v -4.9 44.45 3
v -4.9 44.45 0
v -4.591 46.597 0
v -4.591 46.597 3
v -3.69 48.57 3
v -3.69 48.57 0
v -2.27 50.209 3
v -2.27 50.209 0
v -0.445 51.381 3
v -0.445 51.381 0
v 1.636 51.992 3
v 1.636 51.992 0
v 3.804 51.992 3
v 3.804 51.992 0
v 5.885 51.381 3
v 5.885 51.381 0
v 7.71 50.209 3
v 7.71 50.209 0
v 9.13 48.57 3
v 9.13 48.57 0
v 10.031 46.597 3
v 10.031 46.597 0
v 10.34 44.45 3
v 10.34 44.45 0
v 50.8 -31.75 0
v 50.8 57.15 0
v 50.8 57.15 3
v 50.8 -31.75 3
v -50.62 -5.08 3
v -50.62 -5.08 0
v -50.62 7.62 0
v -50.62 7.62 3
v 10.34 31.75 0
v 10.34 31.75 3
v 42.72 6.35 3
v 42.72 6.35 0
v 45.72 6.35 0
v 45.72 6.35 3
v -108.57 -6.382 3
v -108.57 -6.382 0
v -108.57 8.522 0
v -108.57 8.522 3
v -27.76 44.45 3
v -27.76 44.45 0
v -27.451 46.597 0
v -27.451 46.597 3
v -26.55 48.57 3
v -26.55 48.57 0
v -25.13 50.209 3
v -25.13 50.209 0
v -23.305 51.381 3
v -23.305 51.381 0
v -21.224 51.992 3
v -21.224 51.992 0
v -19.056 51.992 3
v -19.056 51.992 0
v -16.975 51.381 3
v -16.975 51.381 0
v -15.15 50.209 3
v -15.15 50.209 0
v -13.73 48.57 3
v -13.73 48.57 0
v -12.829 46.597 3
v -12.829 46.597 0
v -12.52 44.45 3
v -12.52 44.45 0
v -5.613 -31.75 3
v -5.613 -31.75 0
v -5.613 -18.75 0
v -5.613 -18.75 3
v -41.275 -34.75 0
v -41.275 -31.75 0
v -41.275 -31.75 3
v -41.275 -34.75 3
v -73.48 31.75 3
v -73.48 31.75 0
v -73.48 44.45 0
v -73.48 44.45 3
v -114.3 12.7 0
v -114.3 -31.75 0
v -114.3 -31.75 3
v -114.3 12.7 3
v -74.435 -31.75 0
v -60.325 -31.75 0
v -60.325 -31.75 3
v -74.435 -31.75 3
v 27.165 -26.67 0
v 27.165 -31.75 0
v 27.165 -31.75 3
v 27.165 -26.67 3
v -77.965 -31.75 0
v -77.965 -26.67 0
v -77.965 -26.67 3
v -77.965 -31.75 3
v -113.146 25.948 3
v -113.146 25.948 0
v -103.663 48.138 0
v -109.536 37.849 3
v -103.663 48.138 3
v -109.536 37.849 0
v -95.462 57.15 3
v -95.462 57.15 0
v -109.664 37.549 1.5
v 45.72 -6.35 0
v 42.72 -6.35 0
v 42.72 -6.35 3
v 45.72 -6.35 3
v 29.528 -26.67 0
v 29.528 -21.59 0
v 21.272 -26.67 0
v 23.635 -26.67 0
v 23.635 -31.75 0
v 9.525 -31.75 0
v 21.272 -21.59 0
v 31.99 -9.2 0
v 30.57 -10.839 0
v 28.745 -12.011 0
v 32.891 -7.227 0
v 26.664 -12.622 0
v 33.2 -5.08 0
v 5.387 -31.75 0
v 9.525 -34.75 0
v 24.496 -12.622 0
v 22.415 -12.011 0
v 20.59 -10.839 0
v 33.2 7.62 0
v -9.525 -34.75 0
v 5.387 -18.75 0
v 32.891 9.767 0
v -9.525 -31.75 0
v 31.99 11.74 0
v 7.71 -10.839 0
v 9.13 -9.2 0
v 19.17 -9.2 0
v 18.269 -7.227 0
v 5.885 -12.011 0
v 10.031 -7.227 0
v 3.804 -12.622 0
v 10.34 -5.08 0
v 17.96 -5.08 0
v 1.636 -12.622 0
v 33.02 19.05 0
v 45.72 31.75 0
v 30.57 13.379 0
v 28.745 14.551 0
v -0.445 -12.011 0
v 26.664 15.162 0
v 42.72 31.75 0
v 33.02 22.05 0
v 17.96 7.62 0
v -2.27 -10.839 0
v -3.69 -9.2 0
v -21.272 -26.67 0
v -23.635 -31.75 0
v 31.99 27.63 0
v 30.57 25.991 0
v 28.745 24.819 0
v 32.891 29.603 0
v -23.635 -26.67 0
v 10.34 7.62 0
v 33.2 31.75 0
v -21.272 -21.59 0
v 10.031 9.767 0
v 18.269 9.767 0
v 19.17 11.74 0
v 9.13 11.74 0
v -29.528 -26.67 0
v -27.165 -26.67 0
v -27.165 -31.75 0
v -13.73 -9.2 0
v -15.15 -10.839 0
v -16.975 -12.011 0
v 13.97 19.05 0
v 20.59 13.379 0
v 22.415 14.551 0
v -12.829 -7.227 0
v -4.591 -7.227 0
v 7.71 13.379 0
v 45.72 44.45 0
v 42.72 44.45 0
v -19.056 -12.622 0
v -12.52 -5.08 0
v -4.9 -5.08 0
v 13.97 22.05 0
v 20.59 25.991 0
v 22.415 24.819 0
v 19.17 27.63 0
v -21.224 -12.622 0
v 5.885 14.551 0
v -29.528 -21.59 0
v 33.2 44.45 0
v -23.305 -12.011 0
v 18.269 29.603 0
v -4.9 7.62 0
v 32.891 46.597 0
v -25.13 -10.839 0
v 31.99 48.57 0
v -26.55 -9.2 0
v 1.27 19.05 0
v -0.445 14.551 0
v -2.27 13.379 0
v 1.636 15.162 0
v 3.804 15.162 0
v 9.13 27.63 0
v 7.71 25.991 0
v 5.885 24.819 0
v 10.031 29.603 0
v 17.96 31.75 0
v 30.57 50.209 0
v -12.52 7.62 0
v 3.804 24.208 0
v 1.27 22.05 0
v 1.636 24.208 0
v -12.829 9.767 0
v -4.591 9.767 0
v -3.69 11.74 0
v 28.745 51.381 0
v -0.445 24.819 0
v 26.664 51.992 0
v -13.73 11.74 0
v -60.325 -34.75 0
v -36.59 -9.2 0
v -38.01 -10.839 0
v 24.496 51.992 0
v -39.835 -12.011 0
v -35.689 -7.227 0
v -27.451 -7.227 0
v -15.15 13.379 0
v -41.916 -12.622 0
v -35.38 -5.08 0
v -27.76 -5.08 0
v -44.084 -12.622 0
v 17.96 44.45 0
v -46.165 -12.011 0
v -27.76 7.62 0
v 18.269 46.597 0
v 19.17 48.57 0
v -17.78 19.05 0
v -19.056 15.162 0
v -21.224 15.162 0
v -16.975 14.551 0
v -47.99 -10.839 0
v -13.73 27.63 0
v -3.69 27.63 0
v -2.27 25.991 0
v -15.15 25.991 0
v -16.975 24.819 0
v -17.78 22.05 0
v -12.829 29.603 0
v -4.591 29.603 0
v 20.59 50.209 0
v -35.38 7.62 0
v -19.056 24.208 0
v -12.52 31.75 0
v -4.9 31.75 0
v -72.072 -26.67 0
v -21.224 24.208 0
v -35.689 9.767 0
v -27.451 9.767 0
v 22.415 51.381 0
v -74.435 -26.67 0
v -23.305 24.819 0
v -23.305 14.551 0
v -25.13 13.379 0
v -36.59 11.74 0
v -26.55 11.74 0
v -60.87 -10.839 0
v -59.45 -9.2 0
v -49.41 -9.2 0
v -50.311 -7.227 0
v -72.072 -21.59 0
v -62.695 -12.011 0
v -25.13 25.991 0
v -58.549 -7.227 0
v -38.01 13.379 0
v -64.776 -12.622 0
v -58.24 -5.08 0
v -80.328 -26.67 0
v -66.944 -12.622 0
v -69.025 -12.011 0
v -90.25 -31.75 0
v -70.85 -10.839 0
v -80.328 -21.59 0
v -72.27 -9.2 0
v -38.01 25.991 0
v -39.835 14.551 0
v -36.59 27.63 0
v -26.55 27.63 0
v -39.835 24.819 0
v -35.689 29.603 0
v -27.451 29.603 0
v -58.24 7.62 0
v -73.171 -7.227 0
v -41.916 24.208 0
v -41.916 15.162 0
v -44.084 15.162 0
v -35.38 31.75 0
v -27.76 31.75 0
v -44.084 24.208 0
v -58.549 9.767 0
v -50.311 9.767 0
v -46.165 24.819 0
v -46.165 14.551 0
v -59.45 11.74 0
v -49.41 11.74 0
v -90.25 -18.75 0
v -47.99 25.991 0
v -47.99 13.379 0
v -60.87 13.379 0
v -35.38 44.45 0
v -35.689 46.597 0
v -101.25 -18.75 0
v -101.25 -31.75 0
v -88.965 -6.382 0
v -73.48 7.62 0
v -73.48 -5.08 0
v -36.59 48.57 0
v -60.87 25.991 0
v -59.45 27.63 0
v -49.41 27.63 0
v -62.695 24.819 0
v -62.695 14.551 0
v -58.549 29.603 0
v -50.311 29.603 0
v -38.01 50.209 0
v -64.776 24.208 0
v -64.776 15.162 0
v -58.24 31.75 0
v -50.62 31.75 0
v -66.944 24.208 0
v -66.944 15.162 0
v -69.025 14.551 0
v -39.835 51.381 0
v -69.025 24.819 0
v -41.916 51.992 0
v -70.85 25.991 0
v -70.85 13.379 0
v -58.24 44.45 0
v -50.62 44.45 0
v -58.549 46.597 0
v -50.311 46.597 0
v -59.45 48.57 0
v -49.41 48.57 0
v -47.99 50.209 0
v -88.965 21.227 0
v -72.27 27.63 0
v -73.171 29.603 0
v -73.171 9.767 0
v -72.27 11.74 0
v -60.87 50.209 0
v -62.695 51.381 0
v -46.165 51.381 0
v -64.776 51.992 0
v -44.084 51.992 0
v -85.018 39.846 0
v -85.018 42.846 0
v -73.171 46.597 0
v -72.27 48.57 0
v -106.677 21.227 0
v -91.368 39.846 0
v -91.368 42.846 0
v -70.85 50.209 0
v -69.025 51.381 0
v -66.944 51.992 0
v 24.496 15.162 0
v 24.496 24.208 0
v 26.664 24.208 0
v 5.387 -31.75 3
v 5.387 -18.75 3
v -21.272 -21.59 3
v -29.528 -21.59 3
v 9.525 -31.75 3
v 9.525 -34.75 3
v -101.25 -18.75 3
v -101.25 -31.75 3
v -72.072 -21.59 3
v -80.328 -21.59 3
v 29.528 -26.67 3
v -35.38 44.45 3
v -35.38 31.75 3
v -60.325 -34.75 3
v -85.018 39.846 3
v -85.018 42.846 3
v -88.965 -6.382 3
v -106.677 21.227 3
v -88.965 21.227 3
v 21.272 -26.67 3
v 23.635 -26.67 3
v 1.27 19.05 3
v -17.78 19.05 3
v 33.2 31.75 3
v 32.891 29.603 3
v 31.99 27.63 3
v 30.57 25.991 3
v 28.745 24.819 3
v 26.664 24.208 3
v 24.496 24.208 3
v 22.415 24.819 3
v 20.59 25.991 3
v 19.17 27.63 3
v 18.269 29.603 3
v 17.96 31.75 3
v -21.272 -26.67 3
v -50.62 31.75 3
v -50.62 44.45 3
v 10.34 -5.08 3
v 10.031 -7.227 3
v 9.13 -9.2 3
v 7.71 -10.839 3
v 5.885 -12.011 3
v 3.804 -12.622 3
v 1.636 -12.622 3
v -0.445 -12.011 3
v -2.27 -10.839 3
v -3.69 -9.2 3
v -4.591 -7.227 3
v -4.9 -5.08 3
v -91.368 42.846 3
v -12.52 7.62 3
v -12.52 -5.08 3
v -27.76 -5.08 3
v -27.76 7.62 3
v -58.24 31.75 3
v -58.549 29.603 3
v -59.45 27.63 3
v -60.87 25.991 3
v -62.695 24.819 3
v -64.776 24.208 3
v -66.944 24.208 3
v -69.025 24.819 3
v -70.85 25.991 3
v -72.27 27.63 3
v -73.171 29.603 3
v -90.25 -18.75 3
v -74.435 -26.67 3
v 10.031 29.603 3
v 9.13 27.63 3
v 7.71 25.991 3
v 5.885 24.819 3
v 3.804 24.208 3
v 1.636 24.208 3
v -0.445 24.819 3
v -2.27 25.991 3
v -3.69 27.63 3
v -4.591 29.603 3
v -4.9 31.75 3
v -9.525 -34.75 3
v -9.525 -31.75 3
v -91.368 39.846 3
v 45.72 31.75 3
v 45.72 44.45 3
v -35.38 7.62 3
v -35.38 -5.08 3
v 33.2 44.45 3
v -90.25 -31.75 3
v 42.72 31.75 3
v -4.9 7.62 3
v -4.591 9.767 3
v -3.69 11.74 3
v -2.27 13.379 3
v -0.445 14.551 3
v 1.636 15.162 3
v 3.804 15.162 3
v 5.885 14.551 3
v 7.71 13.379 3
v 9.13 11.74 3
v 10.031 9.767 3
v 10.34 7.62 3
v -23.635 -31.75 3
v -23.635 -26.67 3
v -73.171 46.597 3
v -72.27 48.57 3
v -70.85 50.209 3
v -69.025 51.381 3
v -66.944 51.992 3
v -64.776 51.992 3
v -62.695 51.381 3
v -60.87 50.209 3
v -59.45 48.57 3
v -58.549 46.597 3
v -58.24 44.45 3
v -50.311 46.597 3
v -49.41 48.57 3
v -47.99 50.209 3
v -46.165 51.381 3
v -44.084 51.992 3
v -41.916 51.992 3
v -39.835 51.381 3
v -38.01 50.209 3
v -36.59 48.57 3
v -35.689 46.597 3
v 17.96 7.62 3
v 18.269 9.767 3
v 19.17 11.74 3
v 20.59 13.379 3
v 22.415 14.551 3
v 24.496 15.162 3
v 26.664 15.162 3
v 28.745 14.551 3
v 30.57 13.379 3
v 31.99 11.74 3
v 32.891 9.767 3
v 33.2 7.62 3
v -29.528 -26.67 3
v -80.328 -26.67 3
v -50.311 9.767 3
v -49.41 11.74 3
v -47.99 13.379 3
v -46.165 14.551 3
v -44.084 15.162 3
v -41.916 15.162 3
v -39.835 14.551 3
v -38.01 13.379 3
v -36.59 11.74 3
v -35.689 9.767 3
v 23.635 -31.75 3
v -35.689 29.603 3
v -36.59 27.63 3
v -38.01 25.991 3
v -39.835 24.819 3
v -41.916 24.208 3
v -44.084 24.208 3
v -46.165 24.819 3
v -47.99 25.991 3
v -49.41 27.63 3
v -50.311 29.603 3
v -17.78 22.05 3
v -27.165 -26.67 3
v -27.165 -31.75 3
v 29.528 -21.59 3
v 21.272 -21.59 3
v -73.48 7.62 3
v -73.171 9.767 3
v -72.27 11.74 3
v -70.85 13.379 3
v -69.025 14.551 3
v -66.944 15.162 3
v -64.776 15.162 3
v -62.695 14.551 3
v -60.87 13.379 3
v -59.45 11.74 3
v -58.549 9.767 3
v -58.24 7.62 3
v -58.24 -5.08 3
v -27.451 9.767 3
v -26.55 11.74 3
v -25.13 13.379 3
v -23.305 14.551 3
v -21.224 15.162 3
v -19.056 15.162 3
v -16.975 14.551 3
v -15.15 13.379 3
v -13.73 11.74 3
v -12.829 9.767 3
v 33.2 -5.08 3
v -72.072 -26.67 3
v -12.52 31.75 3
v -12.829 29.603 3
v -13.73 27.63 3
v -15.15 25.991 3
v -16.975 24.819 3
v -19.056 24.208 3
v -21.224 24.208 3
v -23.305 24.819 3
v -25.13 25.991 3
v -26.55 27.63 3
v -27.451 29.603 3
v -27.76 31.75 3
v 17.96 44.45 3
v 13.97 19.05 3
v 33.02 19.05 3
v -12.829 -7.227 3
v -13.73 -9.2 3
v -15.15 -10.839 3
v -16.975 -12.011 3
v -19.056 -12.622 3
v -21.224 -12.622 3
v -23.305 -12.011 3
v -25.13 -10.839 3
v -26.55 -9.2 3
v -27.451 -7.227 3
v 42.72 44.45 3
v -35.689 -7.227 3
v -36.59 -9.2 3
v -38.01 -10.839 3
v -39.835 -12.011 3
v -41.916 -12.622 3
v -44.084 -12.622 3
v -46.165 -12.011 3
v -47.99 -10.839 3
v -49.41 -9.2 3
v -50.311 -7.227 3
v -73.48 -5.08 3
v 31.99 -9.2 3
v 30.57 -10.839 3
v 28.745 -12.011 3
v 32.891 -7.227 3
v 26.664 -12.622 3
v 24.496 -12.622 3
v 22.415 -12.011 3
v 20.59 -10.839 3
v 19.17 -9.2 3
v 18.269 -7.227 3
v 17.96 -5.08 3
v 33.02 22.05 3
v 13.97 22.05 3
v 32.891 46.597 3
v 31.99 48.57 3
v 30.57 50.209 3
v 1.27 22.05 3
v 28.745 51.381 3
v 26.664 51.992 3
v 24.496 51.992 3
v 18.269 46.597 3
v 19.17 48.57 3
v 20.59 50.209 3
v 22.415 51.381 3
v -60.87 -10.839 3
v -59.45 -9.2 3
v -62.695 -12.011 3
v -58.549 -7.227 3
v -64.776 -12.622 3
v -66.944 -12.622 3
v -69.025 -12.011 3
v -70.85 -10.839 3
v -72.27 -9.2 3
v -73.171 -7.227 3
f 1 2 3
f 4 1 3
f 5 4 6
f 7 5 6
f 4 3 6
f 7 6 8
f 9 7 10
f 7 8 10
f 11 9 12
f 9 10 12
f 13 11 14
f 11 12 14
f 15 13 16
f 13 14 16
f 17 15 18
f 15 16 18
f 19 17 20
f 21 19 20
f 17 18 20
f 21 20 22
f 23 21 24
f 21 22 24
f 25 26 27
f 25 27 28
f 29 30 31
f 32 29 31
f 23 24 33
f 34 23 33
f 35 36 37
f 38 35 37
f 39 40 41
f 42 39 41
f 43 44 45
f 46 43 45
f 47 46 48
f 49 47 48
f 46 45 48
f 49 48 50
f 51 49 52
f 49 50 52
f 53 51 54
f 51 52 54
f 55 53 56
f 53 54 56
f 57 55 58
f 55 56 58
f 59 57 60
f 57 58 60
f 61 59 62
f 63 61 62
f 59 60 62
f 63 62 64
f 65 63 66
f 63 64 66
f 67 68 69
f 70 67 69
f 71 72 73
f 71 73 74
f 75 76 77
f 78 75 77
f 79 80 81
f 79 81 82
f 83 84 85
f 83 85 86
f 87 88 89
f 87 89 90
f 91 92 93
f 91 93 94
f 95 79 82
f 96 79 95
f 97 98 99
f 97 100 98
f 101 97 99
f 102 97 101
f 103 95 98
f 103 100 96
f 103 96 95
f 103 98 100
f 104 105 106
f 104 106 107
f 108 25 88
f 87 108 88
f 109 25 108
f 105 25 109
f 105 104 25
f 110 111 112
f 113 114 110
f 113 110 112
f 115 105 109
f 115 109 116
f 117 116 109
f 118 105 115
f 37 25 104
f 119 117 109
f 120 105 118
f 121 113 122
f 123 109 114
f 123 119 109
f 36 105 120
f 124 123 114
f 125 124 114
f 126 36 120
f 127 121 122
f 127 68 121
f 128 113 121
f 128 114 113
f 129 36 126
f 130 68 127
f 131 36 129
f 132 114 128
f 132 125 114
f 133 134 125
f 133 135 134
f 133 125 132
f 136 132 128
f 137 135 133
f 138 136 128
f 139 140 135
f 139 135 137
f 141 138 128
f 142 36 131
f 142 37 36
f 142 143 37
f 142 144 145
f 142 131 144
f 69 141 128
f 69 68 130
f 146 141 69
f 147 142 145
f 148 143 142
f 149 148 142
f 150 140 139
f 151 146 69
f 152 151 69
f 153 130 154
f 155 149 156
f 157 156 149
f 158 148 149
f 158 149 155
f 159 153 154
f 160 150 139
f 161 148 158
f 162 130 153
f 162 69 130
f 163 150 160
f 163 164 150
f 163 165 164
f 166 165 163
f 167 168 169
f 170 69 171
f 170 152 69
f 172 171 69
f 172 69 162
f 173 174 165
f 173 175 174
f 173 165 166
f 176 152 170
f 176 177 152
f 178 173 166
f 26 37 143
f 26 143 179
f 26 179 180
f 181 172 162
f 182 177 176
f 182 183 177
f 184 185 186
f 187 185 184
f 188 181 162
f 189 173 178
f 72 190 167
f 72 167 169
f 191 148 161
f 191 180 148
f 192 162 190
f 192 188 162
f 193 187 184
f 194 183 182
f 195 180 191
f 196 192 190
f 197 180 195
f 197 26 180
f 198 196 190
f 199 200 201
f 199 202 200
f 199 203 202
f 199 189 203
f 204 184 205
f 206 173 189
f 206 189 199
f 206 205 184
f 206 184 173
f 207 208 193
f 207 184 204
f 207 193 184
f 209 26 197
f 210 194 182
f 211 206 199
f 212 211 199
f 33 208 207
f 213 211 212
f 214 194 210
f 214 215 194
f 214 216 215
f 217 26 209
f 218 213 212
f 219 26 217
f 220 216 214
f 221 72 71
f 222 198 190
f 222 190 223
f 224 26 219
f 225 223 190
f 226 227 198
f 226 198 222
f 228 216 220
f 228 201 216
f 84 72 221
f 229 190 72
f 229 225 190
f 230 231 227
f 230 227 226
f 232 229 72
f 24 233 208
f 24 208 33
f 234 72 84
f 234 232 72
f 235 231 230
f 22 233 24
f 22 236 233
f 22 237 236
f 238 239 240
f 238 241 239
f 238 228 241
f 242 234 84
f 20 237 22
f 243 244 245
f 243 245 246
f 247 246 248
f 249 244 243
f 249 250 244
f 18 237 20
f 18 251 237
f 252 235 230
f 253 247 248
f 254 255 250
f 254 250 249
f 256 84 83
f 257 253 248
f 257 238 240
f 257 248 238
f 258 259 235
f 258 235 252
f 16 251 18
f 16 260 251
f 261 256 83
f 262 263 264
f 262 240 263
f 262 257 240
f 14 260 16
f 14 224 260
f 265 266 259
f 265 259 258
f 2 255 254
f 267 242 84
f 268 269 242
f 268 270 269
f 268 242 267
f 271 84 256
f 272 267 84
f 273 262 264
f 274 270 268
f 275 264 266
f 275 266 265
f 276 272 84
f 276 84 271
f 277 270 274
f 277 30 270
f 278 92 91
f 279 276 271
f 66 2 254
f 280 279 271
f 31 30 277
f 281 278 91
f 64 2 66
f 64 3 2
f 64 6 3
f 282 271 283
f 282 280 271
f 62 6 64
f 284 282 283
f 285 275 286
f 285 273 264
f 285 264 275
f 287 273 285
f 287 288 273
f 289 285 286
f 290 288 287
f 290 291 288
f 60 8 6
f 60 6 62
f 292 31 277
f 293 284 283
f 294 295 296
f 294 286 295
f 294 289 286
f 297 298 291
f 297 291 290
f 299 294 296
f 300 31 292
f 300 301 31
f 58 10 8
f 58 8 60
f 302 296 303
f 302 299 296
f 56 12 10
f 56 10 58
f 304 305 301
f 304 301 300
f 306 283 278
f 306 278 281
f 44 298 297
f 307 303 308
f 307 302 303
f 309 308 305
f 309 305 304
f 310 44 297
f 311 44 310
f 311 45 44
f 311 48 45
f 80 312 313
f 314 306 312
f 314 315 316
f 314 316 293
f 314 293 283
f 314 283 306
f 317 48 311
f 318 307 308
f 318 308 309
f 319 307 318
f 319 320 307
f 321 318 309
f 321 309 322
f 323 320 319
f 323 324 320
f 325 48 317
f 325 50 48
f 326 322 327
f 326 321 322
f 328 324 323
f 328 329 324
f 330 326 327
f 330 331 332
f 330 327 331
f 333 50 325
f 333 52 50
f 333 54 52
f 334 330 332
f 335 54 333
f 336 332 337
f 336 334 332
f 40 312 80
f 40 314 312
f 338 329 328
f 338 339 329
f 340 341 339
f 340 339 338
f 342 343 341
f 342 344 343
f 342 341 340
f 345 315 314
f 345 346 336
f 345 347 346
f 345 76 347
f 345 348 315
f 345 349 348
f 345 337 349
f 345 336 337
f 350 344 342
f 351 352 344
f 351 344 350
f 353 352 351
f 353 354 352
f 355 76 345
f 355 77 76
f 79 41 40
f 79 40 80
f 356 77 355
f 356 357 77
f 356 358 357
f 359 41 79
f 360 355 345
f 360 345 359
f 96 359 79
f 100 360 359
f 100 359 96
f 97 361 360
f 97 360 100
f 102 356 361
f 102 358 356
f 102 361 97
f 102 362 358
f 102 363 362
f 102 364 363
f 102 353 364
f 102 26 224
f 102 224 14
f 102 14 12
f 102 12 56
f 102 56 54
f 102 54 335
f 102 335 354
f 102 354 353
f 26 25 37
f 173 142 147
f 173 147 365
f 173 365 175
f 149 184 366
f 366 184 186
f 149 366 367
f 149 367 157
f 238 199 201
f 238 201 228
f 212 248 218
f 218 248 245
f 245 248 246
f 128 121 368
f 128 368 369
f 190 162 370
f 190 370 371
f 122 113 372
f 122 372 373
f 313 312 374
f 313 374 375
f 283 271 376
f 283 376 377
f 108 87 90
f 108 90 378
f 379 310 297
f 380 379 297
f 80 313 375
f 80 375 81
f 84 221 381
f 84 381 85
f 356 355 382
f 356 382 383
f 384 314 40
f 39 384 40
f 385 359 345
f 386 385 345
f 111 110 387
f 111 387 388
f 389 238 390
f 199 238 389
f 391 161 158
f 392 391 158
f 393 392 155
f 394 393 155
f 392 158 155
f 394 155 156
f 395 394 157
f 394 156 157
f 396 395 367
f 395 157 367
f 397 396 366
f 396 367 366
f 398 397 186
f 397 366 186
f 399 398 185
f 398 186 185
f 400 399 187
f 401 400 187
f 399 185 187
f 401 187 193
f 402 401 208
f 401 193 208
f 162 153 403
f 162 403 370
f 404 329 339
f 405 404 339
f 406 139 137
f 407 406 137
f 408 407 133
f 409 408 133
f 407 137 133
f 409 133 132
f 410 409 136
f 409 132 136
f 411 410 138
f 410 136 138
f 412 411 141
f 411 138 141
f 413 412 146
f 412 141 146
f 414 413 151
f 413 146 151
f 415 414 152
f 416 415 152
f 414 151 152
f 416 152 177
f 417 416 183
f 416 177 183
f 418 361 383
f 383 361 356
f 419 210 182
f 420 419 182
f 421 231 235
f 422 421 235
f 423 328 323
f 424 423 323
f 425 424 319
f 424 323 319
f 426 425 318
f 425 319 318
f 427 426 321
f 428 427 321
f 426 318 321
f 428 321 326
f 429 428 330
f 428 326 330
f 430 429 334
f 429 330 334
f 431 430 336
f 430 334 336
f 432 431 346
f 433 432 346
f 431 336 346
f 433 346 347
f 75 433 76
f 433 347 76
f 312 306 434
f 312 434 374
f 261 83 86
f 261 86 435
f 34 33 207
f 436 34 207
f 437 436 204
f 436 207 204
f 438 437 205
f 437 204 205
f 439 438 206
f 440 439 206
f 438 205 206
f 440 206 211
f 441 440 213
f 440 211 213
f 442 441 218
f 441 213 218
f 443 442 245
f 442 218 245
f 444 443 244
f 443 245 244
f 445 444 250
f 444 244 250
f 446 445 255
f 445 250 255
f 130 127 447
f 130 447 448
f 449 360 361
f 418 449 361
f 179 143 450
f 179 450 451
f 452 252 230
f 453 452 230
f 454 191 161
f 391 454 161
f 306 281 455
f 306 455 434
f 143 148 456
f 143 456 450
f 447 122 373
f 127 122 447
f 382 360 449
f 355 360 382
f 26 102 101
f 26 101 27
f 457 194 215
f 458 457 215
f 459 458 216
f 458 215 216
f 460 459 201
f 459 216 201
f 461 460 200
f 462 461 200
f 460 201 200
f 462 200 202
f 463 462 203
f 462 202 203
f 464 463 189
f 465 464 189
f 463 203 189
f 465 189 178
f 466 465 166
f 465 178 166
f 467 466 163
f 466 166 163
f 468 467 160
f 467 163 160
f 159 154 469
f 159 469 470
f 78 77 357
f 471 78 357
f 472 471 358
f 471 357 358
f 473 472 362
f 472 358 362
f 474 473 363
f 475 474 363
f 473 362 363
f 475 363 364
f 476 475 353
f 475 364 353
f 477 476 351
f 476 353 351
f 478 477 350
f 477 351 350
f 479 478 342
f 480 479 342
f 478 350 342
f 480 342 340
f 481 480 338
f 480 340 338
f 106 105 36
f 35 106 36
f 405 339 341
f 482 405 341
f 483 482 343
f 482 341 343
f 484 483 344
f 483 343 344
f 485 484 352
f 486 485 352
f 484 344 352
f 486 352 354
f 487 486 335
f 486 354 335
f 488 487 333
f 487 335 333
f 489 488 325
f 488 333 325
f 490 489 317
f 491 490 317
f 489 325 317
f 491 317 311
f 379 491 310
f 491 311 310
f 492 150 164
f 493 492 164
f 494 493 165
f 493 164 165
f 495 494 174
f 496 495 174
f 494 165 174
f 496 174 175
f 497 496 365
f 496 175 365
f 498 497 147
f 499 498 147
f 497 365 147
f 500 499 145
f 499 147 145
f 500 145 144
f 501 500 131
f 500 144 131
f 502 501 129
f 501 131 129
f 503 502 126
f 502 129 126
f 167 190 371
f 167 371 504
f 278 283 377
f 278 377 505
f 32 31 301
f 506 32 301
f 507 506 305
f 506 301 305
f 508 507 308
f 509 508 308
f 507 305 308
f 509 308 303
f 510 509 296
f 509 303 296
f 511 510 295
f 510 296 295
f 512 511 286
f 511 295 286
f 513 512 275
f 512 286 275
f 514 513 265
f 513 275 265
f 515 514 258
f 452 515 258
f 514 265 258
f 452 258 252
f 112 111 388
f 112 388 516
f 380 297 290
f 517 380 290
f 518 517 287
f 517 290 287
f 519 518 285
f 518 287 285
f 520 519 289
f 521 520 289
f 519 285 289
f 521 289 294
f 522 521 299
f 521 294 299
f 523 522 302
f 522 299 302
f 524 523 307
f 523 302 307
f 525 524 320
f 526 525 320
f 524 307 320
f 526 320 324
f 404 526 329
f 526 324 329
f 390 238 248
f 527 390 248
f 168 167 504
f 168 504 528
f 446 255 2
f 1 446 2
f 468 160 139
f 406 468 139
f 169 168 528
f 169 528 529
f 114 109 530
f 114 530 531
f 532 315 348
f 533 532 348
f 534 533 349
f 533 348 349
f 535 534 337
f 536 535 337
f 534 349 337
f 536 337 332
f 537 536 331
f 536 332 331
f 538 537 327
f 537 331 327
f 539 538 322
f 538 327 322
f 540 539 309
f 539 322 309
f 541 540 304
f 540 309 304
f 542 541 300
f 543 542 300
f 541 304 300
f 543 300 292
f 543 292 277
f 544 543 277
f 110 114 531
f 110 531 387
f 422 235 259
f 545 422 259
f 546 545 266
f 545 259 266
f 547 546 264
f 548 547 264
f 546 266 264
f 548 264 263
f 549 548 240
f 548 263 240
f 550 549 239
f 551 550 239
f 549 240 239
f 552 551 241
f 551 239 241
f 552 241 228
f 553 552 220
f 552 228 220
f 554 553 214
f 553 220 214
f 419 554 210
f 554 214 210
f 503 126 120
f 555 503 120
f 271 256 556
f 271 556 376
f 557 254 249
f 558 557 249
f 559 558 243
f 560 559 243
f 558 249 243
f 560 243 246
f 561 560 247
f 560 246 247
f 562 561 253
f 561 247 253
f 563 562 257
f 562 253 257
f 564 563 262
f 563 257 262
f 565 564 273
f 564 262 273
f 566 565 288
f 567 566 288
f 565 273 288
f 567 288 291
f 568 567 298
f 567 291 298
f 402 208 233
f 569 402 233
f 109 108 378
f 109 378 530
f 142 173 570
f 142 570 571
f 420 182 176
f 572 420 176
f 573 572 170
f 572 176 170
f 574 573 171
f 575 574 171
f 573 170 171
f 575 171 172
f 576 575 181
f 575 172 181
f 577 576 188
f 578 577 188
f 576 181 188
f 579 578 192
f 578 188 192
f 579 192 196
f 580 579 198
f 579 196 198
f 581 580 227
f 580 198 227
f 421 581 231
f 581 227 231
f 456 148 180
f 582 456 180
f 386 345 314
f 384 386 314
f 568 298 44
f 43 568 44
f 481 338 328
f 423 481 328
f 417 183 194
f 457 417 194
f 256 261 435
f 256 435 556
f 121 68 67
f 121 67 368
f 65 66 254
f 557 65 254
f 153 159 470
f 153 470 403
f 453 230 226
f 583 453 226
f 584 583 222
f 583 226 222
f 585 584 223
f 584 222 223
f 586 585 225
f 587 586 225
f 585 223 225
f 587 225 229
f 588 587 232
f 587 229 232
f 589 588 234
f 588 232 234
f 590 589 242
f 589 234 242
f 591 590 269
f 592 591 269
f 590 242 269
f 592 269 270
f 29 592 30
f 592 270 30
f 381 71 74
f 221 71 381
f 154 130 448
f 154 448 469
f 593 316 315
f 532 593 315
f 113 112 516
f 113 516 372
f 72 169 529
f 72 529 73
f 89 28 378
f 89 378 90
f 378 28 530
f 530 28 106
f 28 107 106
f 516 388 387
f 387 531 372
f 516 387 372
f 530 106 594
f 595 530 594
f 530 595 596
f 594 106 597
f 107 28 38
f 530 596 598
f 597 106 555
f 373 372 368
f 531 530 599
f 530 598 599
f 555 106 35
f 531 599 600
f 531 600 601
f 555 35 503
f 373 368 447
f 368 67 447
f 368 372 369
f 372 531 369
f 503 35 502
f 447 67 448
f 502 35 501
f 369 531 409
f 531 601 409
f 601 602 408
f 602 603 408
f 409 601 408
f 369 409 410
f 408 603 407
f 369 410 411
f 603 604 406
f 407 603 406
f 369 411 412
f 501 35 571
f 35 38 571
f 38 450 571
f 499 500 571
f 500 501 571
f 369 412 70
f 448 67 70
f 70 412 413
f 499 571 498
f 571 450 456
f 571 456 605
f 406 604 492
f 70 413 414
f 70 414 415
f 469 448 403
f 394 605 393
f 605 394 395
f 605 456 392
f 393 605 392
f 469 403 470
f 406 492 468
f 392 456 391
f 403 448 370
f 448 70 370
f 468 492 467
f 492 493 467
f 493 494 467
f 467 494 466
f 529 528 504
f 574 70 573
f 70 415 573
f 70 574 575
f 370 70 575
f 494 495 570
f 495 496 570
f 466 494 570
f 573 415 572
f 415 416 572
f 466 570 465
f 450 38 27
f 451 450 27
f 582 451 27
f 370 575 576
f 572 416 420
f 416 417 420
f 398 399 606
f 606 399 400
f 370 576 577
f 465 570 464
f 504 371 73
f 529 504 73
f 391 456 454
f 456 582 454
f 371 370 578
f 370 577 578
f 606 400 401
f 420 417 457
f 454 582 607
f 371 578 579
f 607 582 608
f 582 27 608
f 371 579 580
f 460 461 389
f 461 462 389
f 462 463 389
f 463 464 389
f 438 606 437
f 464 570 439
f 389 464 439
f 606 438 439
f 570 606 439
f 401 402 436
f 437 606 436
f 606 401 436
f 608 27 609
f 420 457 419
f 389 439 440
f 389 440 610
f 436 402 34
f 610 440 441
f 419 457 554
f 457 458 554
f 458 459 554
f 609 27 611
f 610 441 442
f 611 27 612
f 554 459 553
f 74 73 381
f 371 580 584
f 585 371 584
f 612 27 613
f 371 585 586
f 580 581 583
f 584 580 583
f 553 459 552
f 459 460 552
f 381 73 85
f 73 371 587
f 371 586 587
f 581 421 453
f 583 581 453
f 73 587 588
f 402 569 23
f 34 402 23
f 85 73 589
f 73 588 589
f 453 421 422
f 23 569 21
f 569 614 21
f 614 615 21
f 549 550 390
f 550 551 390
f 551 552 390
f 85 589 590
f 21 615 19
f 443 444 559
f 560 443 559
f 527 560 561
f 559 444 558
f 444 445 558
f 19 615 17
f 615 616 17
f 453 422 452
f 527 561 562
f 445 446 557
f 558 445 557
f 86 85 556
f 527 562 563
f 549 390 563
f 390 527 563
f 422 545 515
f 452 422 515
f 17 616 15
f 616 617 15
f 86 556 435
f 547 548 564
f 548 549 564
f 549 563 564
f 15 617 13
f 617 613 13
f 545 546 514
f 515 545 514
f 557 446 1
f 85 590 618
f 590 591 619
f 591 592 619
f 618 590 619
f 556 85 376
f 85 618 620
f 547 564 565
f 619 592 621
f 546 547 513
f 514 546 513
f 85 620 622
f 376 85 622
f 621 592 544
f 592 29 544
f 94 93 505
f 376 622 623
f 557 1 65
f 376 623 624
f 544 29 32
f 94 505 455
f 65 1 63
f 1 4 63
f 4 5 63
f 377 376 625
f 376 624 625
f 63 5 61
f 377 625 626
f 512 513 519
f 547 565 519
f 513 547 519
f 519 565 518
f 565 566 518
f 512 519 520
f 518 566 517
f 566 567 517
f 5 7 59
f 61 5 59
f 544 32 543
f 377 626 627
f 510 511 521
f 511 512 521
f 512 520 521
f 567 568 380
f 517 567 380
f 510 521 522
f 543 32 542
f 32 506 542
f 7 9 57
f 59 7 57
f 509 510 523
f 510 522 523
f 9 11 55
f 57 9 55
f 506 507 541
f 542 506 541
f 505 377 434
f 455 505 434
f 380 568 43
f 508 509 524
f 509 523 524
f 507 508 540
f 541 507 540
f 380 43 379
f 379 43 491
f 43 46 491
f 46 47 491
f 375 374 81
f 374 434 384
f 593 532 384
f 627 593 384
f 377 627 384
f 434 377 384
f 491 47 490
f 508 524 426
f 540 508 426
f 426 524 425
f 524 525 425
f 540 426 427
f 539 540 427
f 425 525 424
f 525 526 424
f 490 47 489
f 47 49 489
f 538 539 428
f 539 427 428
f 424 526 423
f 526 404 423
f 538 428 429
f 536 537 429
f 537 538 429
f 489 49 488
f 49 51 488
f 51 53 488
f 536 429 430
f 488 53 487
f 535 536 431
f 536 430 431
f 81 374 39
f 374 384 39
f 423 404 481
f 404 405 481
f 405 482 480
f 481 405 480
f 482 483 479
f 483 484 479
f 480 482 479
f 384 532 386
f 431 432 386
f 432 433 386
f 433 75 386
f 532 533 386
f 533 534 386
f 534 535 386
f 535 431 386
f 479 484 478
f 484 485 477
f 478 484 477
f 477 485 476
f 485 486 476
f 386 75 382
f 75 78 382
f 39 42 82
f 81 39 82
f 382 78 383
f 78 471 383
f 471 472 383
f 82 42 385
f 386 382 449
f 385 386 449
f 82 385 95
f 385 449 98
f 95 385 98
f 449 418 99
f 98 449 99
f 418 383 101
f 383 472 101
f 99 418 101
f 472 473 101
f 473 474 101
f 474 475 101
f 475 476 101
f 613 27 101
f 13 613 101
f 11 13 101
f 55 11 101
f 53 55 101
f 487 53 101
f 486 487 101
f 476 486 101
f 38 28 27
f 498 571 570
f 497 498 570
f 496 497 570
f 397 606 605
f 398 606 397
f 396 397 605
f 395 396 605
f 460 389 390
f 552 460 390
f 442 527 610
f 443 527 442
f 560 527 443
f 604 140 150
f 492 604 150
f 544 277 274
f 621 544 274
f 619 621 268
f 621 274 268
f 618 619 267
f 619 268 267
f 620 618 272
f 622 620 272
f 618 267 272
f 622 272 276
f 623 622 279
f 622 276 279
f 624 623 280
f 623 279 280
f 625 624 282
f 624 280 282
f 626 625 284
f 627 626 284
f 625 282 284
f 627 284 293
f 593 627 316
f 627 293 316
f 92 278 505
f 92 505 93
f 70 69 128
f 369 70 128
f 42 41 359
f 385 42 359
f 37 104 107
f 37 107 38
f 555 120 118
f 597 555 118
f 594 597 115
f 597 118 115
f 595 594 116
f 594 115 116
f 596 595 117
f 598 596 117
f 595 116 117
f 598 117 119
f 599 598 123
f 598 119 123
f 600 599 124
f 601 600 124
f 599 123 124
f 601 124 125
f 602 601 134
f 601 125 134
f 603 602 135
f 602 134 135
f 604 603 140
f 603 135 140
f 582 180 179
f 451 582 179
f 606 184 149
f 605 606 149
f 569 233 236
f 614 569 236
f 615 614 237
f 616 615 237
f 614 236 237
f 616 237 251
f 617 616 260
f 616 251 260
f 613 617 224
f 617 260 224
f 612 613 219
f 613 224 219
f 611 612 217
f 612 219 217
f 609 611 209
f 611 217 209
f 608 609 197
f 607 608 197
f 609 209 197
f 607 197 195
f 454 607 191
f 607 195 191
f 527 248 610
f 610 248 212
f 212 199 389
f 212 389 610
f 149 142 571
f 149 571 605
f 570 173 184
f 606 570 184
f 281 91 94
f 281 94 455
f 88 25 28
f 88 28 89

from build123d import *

# Parameters (mm, degrees)
SKETCH1_W           = 3
SKETCH1_H           = 12.7
SKETCH1_W_2         = 6.35
SKETCH1_H_2         = 3
SKETCH1_W_3         = 19.05
SKETCH1_W_4         = 11
SKETCH1_H_3         = 13
BOSS_EXTRUDE1_DEPTH = 3


with BuildPart() as part:
    # Sketch1 → Boss-Extrude1 (new body)
    with BuildSketch(Plane.XY):
        with BuildLine():
            Line((50.8, 31.75), (50.8, -31.75))
            Line((50.8, -31.75), (27.1653, -31.75))
            Line((27.1653, -31.75), (27.1653, -26.67))
            Line((27.1653, -26.67), (29.5275, -26.67))
            Line((29.5275, -26.67), (29.5275, -21.59))
            Line((29.5275, -21.59), (21.2725, -21.59))
            Line((21.2725, -21.59), (21.2725, -26.67))
            Line((21.2725, -26.67), (23.6347, -26.67))
            Line((23.6347, -26.67), (23.6347, -31.75))
            Line((23.6347, -31.75), (9.525, -31.75))
            Line((9.525, -31.75), (9.525, -34.75))
            Line((9.525, -34.75), (-9.525, -34.75))
            Line((-9.525, -34.75), (-9.525, -31.75))
            Line((-9.525, -31.75), (-23.6347, -31.75))
            Line((-23.6347, -31.75), (-23.6347, -26.67))
            Line((-23.6347, -26.67), (-21.2725, -26.67))
            Line((-21.2725, -26.67), (-21.2725, -21.59))
            Line((-21.2725, -21.59), (-29.5275, -21.59))
            Line((-29.5275, -21.59), (-29.5275, -26.67))
            Line((-29.5275, -26.67), (-27.1653, -26.67))
            Line((-27.1653, -26.67), (-27.1653, -31.75))
            Line((-27.1653, -31.75), (-41.275, -31.75))
            Line((-41.275, -31.75), (-41.275, -34.75))
            Line((-41.275, -34.75), (-60.325, -34.75))
            Line((-60.325, -34.75), (-60.325, -31.75))
            Line((-60.325, -31.75), (-74.4347, -31.75))
            Line((-74.4347, -31.75), (-74.4347, -26.67))
            Line((-74.4347, -26.67), (-72.0725, -26.67))
            Line((-72.0725, -26.67), (-72.0725, -21.59))
            Line((-72.0725, -21.59), (-80.3275, -21.59))
            Line((-80.3275, -21.59), (-80.3275, -26.67))
            Line((-80.3275, -26.67), (-77.9653, -26.67))
            Line((-77.9653, -26.67), (-77.9653, -31.75))
            Line((-77.9653, -31.75), (-90.25, -31.75))
            Line((-90.25, -31.75), (-90.25, -18.75))
            Line((-90.25, -18.75), (-101.25, -18.75))
            Line((-101.25, -18.75), (-101.25, -31.75))
            Line((-101.25, -31.75), (-114.3, -31.75))
            Line((-114.3, -31.75), (-114.3, 12.7))
            add(Edge.make_bspline(
                [(-114.3, 12.7), (-114.446449762, 40.172975461), (-95.462376933, 57.15)],
                knots=[0, 0, 0, 1, 1, 1], degree=2))
            Line((-95.462376933, 57.15), (50.8, 57.15))
            Line((50.8, 57.15), (50.8, 31.75))
        make_face()
        with BuildLine():
            Line((33.200035124, 7.62), (33.200035124, -5.08))
            ThreePointArc((33.200035124, -5.08), (25.580035124, -12.7), (17.960035124, -5.08))
            Line((17.960035124, -5.08), (17.960035124, 7.62))
            ThreePointArc((17.960035124, 7.62), (25.580035124, 15.24), (33.200035124, 7.62))
        make_face(mode=Mode.SUBTRACT)
        with Locations((44.22, 38.1)):
            Rectangle(SKETCH1_W, SKETCH1_H, mode=Mode.SUBTRACT)
        with BuildLine():
            Line((10.340035124, 7.62), (10.340035124, -5.08))
            ThreePointArc((10.340035124, -5.08), (2.720035124, -12.7), (-4.899964876, -5.08))
            Line((-4.899964876, -5.08), (-4.899964876, 7.62))
            ThreePointArc((-4.899964876, 7.62), (2.720035124, 15.24), (10.340035124, 7.62))
        make_face(mode=Mode.SUBTRACT)
        with BuildLine():
            Line((-12.519964876, 7.62), (-12.519964876, -5.08))
            ThreePointArc((-12.519964876, -5.08), (-20.139964876, -12.7), (-27.759964876, -5.08))
            Line((-27.759964876, -5.08), (-27.759964876, 7.62))
            ThreePointArc((-27.759964876, 7.62), (-20.139964876, 15.24), (-12.519964876, 7.62))
        make_face(mode=Mode.SUBTRACT)
        with Locations((44.22, 0)):
            Rectangle(SKETCH1_W, SKETCH1_H, mode=Mode.SUBTRACT)
        with BuildLine():
            Line((-35.379964876, 7.62), (-35.379964876, -5.08))
            ThreePointArc((-35.379964876, -5.08), (-42.999964876, -12.7), (-50.619964876, -5.08))
            Line((-50.619964876, -5.08), (-50.619964876, 7.62))
            ThreePointArc((-50.619964876, 7.62), (-42.999964876, 15.24), (-35.379964876, 7.62))
        make_face(mode=Mode.SUBTRACT)
        with BuildLine():
            Line((-58.239964876, 7.62), (-58.239964876, -5.08))
            ThreePointArc((-58.239964876, -5.08), (-65.859964876, -12.7), (-73.479964876, -5.08))
            Line((-73.479964876, -5.08), (-73.479964876, 7.62))
            ThreePointArc((-73.479964876, 7.62), (-65.859964876, 15.24), (-58.239964876, 7.62))
        make_face(mode=Mode.SUBTRACT)
        with BuildLine():
            Line((33.200035124, 44.45), (33.200035124, 31.75))
            ThreePointArc((33.200035124, 31.75), (25.580035124, 24.13), (17.960035124, 31.75))
            Line((17.960035124, 31.75), (17.960035124, 44.45))
            ThreePointArc((17.960035124, 44.45), (25.580035124, 52.07), (33.200035124, 44.45))
        make_face(mode=Mode.SUBTRACT)
        with BuildLine():
            Line((10.340035124, 44.45), (10.340035124, 31.75))
            ThreePointArc((10.340035124, 31.75), (2.720035124, 24.13), (-4.899964876, 31.75))
            Line((-4.899964876, 31.75), (-4.899964876, 44.45))
            ThreePointArc((-4.899964876, 44.45), (2.720035124, 52.07), (10.340035124, 44.45))
        make_face(mode=Mode.SUBTRACT)
        with BuildLine():
            Line((-12.519964876, 44.45), (-12.519964876, 31.75))
            ThreePointArc((-12.519964876, 31.75), (-20.139964876, 24.13), (-27.759964876, 31.75))
            Line((-27.759964876, 31.75), (-27.759964876, 44.45))
            ThreePointArc((-27.759964876, 44.45), (-20.139964876, 52.07), (-12.519964876, 44.45))
        make_face(mode=Mode.SUBTRACT)
        with BuildLine():
            Line((-35.379964876, 44.45), (-35.379964876, 31.75))
            ThreePointArc((-35.379964876, 31.75), (-42.999964876, 24.13), (-50.619964876, 31.75))
            Line((-50.619964876, 31.75), (-50.619964876, 44.45))
            ThreePointArc((-50.619964876, 44.45), (-42.999964876, 52.07), (-35.379964876, 44.45))
        make_face(mode=Mode.SUBTRACT)
        with BuildLine():
            Line((-58.239964876, 44.45), (-58.239964876, 31.75))
            ThreePointArc((-58.239964876, 31.75), (-65.859964876, 24.13), (-73.479964876, 31.75))
            Line((-73.479964876, 31.75), (-73.479964876, 44.45))
            ThreePointArc((-73.479964876, 44.45), (-65.859964876, 52.07), (-58.239964876, 44.45))
        make_face(mode=Mode.SUBTRACT)
        Polygon((-108.570127811, 2.130538697), (-108.570127811, 8.521708079), (-106.677281982, 21.226947449), (-101.67507942, 21.226947449), (-88.964755701, 21.226947449), (-88.964755701, -6.382139969), (-108.570127811, -6.382139969), align=None, mode=Mode.SUBTRACT)
        with Locations((-88.193493425, 41.3464095)):
            Rectangle(SKETCH1_W_2, SKETCH1_H_2, mode=Mode.SUBTRACT)
        with Locations((23.495, 20.550240793)):
            Rectangle(SKETCH1_W_3, SKETCH1_H_2, mode=Mode.SUBTRACT)
        with Locations((-8.255, 20.550240793)):
            Rectangle(SKETCH1_W_3, SKETCH1_H_2, mode=Mode.SUBTRACT)
        with Locations((-0.113307165, -25.25)):
            Rectangle(SKETCH1_W_4, SKETCH1_H_3, mode=Mode.SUBTRACT)
    extrude(amount=BOSS_EXTRUDE1_DEPTH)


solid = part.part
